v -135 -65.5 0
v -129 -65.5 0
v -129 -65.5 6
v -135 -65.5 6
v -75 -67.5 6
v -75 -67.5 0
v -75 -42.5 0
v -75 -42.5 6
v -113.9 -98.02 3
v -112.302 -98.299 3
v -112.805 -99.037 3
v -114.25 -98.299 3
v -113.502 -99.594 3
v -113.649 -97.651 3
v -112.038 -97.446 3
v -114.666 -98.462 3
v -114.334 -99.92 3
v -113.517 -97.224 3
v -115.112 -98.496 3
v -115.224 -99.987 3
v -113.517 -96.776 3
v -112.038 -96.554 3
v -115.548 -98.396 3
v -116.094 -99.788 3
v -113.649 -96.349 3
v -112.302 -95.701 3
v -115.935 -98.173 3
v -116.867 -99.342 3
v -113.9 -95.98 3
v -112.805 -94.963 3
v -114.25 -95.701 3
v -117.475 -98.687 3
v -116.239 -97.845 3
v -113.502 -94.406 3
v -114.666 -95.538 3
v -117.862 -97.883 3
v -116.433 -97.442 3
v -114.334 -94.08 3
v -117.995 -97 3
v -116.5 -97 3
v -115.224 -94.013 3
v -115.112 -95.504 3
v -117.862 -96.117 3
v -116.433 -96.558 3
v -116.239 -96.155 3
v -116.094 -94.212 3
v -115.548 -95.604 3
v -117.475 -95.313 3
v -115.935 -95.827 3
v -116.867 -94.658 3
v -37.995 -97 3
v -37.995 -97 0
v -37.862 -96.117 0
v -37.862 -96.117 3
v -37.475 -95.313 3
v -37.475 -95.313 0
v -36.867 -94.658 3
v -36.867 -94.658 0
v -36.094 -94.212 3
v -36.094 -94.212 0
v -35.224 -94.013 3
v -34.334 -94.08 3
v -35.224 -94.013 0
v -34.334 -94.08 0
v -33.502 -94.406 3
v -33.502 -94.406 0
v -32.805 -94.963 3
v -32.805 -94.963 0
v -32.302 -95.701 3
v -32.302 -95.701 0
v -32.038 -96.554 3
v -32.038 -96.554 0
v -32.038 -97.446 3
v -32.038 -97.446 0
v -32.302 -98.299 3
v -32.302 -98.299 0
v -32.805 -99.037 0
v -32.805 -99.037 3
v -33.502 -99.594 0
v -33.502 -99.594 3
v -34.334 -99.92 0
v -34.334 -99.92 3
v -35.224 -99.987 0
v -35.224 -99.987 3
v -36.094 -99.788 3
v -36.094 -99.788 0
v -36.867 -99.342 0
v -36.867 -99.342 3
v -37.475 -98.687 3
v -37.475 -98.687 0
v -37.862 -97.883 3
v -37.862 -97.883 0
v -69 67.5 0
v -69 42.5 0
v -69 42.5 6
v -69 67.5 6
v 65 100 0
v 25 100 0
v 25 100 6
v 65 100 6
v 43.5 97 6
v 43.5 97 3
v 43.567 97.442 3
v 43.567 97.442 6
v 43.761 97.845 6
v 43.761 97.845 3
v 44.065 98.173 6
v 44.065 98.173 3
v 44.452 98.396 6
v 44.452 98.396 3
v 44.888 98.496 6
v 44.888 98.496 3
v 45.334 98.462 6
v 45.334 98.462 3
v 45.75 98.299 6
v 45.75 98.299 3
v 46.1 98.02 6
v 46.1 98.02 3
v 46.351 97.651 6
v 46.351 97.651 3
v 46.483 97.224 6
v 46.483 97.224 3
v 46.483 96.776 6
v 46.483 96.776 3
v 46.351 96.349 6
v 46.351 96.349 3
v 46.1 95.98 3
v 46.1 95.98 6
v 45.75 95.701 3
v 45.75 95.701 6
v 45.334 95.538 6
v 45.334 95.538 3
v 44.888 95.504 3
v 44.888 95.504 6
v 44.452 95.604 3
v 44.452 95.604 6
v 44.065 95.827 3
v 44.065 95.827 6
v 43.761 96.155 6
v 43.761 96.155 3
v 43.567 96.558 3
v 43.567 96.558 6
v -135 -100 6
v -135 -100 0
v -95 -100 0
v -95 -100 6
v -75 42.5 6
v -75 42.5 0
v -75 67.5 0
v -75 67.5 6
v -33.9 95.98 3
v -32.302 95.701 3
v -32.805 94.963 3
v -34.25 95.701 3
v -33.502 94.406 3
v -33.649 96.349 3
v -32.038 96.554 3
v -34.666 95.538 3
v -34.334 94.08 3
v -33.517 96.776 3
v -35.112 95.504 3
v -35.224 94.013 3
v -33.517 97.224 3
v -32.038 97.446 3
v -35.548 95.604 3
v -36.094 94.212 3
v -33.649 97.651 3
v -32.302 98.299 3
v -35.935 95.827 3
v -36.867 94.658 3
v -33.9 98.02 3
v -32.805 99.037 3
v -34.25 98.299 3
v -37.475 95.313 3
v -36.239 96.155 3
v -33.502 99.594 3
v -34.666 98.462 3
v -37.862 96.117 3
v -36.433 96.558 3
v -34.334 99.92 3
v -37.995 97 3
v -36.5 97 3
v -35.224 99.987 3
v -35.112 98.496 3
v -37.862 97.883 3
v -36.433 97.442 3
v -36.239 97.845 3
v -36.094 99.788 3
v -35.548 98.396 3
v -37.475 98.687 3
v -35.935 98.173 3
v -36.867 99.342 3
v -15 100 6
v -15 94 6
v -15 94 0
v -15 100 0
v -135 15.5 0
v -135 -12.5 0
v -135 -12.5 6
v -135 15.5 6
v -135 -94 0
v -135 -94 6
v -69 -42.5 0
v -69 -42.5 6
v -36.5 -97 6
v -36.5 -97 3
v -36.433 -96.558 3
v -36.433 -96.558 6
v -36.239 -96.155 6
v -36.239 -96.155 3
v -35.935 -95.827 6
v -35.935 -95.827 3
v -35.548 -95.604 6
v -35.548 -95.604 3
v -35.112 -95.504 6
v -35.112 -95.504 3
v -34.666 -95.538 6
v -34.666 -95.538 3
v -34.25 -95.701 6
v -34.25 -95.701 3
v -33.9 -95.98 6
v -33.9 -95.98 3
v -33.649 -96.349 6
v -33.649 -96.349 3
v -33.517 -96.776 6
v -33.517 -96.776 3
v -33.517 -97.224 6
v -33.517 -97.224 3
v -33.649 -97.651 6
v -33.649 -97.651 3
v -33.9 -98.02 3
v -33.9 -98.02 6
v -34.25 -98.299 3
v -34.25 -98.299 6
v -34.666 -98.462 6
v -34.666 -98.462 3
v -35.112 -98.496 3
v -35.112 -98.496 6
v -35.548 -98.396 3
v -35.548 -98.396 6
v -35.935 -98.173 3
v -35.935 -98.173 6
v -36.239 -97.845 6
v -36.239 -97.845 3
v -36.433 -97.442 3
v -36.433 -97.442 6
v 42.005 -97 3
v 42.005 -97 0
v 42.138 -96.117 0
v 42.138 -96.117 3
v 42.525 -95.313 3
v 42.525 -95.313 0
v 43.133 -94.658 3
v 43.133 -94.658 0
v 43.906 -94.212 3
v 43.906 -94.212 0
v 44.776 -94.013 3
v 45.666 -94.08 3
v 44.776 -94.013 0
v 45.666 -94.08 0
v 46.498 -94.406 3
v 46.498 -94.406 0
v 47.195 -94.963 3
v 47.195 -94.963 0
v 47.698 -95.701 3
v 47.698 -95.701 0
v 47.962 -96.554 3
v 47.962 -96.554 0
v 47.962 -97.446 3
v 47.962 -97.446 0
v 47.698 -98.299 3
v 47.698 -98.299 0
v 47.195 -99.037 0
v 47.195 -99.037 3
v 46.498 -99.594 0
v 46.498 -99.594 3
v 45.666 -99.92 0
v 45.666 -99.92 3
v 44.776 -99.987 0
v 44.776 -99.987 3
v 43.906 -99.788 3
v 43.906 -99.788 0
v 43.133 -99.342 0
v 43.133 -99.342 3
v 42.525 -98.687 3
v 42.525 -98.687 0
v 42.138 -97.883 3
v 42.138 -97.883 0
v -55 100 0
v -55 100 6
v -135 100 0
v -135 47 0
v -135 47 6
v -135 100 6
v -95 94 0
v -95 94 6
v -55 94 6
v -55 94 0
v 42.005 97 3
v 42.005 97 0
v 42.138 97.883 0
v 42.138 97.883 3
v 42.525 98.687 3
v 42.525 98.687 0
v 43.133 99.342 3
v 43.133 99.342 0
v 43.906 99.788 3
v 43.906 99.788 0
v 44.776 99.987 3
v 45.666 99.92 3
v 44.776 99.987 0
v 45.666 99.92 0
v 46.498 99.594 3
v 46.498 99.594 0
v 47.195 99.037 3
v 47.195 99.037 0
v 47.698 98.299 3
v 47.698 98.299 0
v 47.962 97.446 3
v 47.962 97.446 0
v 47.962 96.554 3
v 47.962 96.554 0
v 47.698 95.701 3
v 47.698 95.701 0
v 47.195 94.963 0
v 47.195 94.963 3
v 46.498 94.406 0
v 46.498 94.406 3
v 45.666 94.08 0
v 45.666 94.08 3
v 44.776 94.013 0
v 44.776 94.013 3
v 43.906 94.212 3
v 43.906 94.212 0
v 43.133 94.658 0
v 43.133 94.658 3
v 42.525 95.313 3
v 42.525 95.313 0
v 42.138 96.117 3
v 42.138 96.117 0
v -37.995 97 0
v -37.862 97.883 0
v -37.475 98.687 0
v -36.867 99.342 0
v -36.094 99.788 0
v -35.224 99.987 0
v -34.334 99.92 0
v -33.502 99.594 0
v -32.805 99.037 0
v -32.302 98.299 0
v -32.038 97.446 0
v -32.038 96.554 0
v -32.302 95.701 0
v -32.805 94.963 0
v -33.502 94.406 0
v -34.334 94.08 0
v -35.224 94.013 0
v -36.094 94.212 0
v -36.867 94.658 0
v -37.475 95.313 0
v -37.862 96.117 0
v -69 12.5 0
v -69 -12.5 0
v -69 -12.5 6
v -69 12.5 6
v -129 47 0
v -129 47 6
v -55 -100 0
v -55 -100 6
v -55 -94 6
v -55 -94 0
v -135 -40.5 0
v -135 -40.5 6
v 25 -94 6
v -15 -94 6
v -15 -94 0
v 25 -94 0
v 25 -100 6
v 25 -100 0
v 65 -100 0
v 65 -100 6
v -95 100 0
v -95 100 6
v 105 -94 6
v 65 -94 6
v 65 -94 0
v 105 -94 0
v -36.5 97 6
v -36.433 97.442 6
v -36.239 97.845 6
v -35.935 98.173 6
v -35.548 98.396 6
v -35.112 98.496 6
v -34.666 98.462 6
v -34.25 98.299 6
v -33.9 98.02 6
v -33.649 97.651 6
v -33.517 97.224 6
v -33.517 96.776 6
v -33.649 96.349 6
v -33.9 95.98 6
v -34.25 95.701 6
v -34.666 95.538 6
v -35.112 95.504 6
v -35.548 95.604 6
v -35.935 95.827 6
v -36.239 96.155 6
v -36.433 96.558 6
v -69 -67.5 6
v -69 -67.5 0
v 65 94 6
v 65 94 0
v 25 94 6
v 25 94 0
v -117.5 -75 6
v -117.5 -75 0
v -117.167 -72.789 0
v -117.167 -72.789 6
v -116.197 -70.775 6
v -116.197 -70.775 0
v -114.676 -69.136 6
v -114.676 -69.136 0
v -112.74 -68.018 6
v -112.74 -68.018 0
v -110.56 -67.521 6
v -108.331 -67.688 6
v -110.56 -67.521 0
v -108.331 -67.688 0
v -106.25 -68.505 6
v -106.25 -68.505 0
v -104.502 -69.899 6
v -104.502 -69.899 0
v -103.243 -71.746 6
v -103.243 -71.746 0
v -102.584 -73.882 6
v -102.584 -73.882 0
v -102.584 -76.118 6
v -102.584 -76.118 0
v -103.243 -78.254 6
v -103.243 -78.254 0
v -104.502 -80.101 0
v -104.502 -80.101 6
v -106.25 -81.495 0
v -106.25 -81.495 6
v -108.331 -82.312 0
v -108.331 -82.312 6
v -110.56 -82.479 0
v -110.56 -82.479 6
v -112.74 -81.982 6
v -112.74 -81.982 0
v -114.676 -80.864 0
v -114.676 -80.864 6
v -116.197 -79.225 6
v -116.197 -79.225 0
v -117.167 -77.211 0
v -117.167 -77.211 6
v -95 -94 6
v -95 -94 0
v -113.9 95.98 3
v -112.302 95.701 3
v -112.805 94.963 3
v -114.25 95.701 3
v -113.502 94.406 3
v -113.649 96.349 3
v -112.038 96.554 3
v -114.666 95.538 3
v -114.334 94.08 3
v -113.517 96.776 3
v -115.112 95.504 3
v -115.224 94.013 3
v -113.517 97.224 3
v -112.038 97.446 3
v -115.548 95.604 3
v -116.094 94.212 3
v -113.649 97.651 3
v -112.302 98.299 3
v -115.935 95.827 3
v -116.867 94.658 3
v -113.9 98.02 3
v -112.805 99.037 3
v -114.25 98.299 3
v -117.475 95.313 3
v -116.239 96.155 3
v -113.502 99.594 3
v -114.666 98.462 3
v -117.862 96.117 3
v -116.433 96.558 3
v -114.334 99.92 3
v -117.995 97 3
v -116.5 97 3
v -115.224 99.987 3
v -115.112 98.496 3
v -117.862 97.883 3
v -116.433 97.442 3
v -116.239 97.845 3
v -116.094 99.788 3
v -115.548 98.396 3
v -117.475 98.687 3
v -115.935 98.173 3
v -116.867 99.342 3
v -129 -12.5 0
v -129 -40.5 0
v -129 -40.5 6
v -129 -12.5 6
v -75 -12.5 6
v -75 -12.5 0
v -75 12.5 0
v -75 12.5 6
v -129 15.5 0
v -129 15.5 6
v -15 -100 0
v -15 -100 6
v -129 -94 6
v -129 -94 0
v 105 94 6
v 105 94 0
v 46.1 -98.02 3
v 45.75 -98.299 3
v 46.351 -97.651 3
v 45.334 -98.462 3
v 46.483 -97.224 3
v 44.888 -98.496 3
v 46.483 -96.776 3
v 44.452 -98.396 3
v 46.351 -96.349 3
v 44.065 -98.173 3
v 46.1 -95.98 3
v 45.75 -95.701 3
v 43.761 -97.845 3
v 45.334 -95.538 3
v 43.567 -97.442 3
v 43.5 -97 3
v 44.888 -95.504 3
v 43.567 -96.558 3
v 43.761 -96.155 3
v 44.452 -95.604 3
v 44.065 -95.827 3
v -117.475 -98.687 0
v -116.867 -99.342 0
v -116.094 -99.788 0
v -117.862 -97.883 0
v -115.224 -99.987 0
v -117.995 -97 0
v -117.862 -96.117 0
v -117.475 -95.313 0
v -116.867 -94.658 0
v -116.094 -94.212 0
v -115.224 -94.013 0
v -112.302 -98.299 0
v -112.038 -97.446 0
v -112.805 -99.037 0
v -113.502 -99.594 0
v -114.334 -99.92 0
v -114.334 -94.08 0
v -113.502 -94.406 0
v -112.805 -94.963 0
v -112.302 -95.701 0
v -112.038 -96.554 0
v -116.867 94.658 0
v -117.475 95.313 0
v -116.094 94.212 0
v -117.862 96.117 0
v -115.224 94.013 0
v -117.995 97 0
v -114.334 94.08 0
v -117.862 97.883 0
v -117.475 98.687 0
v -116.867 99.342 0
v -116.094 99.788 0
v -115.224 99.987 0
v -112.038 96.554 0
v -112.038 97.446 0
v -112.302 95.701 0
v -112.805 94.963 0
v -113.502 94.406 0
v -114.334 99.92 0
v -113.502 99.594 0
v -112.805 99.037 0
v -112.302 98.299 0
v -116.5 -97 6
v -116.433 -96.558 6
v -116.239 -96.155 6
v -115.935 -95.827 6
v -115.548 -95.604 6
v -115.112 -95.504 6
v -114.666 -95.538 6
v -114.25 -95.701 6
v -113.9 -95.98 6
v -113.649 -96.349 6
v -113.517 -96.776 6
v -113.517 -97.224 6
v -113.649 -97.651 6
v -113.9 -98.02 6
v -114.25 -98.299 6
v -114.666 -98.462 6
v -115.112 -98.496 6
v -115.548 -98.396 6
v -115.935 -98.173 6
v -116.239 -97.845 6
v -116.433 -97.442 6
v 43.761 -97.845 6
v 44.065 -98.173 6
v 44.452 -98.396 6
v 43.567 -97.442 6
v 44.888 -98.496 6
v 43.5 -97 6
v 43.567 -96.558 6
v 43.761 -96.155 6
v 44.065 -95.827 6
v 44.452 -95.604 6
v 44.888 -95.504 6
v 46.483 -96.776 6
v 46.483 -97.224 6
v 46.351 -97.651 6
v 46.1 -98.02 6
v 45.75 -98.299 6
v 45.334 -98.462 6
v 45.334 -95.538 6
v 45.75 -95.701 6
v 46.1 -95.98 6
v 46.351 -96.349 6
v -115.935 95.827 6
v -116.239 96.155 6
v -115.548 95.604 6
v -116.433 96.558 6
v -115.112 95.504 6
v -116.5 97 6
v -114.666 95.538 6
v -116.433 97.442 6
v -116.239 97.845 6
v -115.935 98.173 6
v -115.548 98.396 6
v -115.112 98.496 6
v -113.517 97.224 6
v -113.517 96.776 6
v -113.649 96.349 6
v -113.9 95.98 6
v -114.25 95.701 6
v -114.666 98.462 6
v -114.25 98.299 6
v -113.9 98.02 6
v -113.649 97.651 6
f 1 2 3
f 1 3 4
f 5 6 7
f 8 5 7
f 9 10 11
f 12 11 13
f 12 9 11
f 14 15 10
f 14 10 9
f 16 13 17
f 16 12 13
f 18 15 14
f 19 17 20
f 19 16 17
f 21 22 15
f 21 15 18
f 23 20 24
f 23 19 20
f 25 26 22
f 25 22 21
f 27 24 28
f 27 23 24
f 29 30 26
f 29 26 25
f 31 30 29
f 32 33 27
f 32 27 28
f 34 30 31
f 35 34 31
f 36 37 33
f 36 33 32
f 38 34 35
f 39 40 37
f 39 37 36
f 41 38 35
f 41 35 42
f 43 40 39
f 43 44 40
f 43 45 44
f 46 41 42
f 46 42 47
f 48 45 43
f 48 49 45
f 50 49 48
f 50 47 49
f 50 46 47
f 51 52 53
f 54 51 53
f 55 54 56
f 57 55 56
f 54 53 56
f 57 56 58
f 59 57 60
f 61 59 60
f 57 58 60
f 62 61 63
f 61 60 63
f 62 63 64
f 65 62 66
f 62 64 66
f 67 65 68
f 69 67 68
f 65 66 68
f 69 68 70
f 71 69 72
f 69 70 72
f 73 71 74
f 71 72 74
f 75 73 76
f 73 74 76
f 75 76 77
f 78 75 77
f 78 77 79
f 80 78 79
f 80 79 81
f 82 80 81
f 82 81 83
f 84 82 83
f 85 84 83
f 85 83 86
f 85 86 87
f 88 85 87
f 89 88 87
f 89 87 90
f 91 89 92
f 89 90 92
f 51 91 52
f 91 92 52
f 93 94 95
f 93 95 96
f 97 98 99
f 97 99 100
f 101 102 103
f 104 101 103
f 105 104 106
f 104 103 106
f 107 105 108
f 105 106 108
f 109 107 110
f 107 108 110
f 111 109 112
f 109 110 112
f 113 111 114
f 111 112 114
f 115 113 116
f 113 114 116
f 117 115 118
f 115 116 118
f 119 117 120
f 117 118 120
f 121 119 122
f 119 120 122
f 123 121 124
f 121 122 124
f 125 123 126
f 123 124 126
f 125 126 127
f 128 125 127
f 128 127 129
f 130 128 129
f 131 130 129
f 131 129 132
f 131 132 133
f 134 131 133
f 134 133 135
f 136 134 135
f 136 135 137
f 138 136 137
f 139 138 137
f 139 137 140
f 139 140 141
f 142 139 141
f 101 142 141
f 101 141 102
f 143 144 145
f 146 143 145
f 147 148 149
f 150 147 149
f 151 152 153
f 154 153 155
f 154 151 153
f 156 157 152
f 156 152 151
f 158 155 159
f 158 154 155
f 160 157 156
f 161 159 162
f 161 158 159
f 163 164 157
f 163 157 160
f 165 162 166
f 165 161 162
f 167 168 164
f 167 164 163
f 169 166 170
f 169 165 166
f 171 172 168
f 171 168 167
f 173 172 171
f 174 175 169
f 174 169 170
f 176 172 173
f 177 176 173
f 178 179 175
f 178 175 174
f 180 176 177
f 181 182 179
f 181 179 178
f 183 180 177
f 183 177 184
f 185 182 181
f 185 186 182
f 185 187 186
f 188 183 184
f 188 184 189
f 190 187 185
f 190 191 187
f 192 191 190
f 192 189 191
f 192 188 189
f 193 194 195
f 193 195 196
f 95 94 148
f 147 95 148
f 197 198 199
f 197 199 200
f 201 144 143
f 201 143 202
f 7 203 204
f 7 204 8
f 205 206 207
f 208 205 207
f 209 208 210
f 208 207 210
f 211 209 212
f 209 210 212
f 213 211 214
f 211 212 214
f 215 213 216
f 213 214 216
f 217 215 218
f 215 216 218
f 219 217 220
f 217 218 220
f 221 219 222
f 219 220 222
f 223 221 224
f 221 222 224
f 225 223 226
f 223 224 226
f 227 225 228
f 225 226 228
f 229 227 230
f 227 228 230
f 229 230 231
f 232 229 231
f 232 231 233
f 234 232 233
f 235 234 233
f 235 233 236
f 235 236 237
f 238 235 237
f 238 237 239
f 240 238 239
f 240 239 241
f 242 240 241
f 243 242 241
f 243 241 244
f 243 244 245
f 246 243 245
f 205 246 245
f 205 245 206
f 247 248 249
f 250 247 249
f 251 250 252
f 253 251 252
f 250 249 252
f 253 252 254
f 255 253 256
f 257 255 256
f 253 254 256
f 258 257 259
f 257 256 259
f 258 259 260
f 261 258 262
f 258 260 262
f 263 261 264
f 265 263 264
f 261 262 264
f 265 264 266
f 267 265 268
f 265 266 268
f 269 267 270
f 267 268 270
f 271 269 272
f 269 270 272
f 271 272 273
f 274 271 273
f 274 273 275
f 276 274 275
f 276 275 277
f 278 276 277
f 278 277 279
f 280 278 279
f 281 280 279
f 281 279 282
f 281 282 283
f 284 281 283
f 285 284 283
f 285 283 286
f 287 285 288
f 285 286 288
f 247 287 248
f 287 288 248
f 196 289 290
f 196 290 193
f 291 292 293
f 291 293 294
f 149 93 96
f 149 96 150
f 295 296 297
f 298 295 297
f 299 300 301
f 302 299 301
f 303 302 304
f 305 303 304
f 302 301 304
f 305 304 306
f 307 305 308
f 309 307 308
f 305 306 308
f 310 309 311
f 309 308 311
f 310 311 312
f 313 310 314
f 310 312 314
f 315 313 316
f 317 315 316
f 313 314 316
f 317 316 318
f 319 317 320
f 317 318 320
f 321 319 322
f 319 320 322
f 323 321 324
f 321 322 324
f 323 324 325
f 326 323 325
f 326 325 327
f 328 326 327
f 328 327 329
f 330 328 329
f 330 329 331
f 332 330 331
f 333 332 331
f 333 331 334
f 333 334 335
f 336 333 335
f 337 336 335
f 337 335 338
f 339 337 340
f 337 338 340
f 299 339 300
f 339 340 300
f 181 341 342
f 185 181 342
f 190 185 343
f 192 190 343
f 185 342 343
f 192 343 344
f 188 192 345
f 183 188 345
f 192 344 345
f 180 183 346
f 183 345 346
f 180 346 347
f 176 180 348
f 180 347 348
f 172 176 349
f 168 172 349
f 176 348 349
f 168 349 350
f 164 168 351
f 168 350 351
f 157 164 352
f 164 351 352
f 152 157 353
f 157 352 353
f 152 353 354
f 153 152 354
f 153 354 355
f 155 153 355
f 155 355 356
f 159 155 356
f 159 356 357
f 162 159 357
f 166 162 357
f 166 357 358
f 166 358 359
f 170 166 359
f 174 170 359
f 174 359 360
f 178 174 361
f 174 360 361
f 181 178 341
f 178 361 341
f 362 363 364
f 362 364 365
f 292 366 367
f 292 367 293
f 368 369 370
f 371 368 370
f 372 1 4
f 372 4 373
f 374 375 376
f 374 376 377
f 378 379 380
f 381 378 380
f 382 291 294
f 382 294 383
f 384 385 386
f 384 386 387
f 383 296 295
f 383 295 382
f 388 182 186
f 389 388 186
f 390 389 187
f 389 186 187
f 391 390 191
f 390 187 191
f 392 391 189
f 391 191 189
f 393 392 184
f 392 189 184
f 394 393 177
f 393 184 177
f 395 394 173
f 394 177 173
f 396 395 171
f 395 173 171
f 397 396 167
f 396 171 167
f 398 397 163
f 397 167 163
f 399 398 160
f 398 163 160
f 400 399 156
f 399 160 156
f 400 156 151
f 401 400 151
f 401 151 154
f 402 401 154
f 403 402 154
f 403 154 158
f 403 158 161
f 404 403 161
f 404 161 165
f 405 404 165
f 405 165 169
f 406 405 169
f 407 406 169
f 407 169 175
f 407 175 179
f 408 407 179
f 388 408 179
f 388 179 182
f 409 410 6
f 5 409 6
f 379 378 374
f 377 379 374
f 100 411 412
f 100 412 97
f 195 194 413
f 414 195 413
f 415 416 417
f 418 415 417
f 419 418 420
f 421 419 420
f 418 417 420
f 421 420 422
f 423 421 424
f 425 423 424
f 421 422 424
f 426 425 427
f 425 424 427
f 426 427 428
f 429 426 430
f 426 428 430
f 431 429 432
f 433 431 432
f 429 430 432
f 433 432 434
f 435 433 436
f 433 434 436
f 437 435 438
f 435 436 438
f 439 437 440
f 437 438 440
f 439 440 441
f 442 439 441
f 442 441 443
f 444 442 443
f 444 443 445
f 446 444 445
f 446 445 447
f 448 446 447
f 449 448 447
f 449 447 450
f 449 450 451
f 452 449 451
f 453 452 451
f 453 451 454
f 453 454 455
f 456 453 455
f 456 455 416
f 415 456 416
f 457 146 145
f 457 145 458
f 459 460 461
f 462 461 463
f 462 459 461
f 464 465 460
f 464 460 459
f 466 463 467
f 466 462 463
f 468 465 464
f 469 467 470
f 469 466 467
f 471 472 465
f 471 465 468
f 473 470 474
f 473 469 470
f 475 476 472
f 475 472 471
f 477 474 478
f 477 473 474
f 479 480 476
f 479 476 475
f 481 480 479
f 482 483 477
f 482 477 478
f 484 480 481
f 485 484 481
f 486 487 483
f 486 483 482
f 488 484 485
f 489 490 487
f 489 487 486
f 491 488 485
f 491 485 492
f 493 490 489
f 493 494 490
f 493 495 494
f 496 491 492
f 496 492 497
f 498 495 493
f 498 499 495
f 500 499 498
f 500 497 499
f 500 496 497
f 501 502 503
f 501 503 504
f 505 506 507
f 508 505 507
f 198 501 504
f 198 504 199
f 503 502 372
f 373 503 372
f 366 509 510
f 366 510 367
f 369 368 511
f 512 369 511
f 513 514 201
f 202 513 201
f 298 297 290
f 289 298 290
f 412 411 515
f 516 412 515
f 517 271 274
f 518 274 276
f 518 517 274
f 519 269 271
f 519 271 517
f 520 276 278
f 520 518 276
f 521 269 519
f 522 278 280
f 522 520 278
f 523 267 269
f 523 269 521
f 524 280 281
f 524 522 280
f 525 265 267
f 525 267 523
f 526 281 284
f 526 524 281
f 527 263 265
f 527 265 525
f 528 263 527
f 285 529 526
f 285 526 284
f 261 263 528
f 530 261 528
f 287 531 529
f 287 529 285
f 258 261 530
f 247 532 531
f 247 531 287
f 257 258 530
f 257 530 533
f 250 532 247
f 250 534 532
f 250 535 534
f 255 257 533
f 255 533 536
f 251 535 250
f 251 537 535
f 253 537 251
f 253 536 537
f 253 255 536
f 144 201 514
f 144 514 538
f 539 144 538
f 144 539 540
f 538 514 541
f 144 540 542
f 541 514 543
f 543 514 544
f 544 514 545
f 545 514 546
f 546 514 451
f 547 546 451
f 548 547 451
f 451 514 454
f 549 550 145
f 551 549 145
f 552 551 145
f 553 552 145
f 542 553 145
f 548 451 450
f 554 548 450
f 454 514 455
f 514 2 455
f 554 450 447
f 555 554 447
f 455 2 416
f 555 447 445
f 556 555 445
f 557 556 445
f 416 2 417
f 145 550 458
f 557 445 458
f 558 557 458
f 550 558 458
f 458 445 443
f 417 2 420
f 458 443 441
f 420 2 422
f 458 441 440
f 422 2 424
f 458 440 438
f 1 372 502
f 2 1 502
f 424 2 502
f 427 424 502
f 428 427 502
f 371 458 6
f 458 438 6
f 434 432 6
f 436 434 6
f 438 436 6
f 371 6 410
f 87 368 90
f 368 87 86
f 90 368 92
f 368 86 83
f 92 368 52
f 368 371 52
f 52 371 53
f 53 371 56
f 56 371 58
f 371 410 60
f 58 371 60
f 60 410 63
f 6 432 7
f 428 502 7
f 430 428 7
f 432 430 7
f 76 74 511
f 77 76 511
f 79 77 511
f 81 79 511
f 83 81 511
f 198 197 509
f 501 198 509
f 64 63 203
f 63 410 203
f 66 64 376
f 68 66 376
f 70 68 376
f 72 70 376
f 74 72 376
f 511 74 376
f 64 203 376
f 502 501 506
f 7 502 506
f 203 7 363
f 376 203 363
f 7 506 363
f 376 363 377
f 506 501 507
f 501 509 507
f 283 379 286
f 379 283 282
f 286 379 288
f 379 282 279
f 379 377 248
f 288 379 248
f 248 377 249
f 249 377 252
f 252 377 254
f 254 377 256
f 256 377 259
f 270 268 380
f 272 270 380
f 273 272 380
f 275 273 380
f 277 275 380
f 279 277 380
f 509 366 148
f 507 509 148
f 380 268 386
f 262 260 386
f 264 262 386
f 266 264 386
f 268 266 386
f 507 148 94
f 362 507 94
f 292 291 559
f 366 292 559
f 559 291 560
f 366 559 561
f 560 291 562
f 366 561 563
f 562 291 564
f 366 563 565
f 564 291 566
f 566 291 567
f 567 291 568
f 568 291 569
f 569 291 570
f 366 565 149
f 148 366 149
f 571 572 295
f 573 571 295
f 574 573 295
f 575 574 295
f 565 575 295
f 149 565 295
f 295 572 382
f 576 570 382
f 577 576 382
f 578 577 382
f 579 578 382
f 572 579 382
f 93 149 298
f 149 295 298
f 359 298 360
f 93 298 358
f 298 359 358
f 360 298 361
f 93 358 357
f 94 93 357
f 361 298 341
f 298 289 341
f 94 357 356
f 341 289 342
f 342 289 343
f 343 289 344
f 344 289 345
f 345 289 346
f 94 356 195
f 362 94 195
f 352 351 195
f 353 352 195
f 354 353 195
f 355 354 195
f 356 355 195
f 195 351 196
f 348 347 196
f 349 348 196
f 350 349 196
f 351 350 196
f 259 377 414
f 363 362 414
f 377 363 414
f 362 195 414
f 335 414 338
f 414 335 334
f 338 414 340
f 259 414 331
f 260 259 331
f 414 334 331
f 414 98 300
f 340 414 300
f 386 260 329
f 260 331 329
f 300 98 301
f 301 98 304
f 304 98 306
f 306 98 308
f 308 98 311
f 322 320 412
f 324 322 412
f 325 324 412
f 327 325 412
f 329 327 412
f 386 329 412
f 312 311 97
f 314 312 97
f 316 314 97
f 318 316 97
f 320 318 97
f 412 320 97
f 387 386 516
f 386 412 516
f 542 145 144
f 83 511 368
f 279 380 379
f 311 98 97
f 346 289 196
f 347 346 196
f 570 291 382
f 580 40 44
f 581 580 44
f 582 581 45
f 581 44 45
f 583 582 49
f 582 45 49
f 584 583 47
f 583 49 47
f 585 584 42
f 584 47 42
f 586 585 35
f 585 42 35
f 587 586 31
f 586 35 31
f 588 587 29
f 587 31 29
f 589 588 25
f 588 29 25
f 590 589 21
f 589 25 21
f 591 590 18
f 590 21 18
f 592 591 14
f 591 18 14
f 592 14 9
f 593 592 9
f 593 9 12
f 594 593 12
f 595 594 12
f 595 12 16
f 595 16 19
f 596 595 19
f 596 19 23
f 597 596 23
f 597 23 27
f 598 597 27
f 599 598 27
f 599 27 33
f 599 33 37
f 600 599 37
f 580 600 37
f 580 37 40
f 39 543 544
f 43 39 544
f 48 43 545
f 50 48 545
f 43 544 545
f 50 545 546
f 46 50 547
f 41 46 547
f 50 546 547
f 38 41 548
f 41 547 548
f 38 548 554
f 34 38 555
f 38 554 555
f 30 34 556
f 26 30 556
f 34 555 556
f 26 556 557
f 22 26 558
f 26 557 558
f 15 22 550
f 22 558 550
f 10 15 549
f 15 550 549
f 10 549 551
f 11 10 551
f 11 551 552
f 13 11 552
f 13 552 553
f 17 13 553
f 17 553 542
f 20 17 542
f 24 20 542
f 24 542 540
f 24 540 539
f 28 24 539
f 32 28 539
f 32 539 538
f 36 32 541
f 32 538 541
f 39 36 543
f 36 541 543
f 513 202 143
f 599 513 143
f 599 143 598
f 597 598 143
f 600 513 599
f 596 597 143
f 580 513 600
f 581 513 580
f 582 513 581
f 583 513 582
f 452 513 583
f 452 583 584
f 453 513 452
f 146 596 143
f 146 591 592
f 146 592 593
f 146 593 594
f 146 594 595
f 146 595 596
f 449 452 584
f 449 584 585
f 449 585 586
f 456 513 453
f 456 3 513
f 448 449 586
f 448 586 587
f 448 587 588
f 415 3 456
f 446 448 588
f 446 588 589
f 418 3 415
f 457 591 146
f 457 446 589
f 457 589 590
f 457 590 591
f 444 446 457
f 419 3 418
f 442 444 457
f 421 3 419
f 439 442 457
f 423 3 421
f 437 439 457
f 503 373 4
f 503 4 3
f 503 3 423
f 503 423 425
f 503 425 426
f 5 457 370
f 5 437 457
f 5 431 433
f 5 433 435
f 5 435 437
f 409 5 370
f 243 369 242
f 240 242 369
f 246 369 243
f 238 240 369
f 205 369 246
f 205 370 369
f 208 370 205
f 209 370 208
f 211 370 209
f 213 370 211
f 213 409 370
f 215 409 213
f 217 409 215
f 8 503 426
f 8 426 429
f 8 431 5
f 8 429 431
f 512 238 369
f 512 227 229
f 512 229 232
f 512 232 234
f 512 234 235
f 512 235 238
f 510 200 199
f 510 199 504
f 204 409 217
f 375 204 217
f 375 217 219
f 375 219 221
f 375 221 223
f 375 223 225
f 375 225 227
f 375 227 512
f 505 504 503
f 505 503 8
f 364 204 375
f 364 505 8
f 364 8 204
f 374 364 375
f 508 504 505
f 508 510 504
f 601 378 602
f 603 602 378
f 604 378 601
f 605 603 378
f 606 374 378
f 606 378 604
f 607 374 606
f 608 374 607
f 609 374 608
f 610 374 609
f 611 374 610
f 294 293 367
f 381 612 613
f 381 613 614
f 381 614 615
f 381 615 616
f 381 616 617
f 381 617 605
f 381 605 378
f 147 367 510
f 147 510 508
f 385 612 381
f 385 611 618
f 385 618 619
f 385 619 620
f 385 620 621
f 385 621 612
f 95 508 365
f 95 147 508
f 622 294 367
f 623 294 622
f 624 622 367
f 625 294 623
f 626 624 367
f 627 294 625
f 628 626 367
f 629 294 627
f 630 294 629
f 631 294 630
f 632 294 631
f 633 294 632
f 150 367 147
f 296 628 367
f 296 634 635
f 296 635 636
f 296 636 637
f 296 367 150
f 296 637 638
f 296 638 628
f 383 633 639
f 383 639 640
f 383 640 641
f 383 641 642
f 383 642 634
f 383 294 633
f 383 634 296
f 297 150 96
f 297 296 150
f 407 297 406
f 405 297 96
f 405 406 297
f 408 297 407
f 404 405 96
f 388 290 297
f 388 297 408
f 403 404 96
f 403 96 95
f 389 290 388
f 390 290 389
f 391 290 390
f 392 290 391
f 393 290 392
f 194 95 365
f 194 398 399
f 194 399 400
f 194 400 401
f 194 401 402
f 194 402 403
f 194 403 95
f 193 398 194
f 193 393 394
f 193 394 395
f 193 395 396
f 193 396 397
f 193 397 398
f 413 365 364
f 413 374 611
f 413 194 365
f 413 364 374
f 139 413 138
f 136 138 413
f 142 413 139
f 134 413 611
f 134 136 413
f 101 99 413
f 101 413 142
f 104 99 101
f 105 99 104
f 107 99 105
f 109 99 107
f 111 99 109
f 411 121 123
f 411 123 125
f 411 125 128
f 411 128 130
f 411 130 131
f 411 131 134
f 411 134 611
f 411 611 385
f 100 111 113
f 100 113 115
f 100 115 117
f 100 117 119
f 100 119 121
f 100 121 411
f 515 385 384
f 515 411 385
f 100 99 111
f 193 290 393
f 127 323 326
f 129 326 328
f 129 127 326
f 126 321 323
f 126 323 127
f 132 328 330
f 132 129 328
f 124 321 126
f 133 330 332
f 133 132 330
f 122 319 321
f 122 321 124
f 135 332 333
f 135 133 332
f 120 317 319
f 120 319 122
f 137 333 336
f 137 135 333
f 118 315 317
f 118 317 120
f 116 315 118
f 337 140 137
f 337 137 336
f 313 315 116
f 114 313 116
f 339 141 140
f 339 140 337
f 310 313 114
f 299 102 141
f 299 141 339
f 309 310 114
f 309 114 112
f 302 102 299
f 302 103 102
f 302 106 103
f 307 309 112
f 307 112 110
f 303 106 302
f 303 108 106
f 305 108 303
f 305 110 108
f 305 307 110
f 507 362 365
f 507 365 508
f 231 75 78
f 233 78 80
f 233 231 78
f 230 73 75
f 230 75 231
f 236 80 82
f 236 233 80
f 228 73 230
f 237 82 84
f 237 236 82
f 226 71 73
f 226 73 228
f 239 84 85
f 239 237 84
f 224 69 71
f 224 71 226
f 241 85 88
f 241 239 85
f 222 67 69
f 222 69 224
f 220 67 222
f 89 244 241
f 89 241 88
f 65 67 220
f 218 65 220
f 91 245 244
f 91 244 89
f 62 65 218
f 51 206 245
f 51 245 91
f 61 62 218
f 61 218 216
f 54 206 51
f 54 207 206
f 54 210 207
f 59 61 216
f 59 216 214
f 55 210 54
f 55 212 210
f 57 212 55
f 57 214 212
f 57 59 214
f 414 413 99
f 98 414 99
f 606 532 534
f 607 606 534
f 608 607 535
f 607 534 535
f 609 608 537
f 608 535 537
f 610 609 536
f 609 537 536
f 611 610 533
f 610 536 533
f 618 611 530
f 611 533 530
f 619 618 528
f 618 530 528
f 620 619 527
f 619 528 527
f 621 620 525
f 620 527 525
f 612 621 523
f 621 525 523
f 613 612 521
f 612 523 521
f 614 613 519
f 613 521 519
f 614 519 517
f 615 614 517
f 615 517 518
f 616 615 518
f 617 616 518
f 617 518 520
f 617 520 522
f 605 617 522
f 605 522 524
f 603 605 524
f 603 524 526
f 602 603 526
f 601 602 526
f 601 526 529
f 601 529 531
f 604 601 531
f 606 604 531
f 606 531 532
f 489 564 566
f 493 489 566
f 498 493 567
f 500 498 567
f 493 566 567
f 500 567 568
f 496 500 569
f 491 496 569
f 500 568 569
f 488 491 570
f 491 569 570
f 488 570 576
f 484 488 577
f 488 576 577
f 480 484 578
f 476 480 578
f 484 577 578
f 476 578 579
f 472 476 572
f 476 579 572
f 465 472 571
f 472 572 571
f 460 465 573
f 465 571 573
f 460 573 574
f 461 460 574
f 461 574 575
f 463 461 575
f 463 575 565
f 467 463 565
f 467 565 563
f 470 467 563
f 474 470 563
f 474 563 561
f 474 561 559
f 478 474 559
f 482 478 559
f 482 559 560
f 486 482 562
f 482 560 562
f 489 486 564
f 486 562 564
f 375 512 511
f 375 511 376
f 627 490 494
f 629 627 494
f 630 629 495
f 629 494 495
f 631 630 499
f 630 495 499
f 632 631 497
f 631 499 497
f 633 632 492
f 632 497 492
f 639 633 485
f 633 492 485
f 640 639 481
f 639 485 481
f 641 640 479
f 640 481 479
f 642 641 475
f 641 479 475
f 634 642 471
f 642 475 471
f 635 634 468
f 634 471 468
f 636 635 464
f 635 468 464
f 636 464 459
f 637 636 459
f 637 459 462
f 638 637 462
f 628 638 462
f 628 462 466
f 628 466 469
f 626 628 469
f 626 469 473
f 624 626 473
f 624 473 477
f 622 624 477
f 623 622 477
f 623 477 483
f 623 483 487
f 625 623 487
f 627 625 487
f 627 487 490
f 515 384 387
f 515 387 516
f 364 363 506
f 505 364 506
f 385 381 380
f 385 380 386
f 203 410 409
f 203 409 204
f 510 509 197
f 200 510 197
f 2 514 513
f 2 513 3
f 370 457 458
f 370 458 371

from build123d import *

# Parameters (mm, degrees)
ESQUISSE1_W             = 270
ESQUISSE1_H             = 200
BOSS_EXTRU_1_DEPTH      = 6
ESQUISSE2_R             = 7.5
ENL_V_MAT_EXTRU_1_DEPTH = 10
ESQUISSE4_W             = 40
ESQUISSE4_H             = 6
ESQUISSE4_W_2           = 6
ESQUISSE4_H_2           = 50
ESQUISSE4_H_3           = 40
ENL_V_MAT_EXTRU_2_DEPTH = 6
ESQUISSE5_W             = 6
ESQUISSE5_H             = 25
ENL_V_MAT_EXTRU_3_DEPTH = 10
ESQUISSE6_W             = 30.179320299
ESQUISSE6_H             = 200.522044325
ENL_V_MAT_EXTRU_4_DEPTH = 169.110082981
ESQUISSE7_R             = 2.995
ENL_V_MAT_EXTRU_5_DEPTH = 3
ESQUISSE8_R             = 1.5
ENL_V_MAT_EXTRU_6_DEPTH = 13
ESQUISSE9_W             = 6
ESQUISSE9_H             = 28.5
ESQUISSE9_H_2           = 28
ESQUISSE9_H_3           = 31.5
ENL_V_MAT_EXTRU_7_DEPTH = 10


with BuildPart() as part:
    # Esquisse1 → Boss.-Extru.1 (new body)
    with BuildSketch(Plane.XY):
        Rectangle(ESQUISSE1_W, ESQUISSE1_H)
    extrude(amount=BOSS_EXTRU_1_DEPTH)

    # Esquisse2 → Enlèv. mat.-Extru.1 (cut)
    with BuildSketch(Plane(origin=(0, 0, 0), x_dir=(-1, 0, 0), z_dir=(0, 0, -1))):
        with Locations((110, -75)):
            Circle(ESQUISSE2_R)
    extrude(amount=-ENL_V_MAT_EXTRU_1_DEPTH, mode=Mode.SUBTRACT)

    # Esquisse4 → Enlèv. mat.-Extru.2 (cut)
    with BuildSketch(Plane.XY.offset(6)):
        with Locations((-75, -97)):
            Rectangle(ESQUISSE4_W, ESQUISSE4_H)
        with Locations((5, -97)):
            Rectangle(ESQUISSE4_W, ESQUISSE4_H)
        with Locations((85, -97)):
            Rectangle(ESQUISSE4_W, ESQUISSE4_H)
        with Locations((-75, 97)):
            Rectangle(ESQUISSE4_W, ESQUISSE4_H)
        with Locations((5, 97)):
            Rectangle(ESQUISSE4_W, ESQUISSE4_H)
        with Locations((85, 97)):
            Rectangle(ESQUISSE4_W, ESQUISSE4_H)
        with Locations((132, -75)):
            Rectangle(ESQUISSE4_W_2, ESQUISSE4_H_2)
        with Locations((132, 75)):
            Rectangle(ESQUISSE4_W_2, ESQUISSE4_H_2)
        with Locations((132, 0)):
            Rectangle(ESQUISSE4_W_2, ESQUISSE4_H_3)
    extrude(amount=-ENL_V_MAT_EXTRU_2_DEPTH, mode=Mode.SUBTRACT)

    # Esquisse5 → Enlèv. mat.-Extru.3 (cut)
    with BuildSketch(Plane(origin=(0, 0, 0), x_dir=(-1, 0, 0), z_dir=(0, 0, -1))):
        with Locations((72, -55)):
            Rectangle(ESQUISSE5_W, ESQUISSE5_H)
        with Locations((72, 0)):
            Rectangle(ESQUISSE5_W, ESQUISSE5_H)
        with Locations((72, 55)):
            Rectangle(ESQUISSE5_W, ESQUISSE5_H)
    extrude(amount=-ENL_V_MAT_EXTRU_3_DEPTH, mode=Mode.SUBTRACT)

    # Esquisse6 → Enlèv. mat.-Extru.4 (cut, through all)
    with BuildSketch(Plane.XY.offset(6)):
        with Locations((120.08966015, -0.261022163)):
            Rectangle(ESQUISSE6_W, ESQUISSE6_H)
    extrude(amount=-ENL_V_MAT_EXTRU_4_DEPTH, mode=Mode.SUBTRACT)

    # Esquisse7 → Enlèv. mat.-Extru.5 (cut)
    with BuildSketch(Plane(origin=(0, 0, 0), x_dir=(-1, 0, 0), z_dir=(0, 0, -1))):
        with Locations((-45, 97)):
            Circle(ESQUISSE7_R)
        with Locations((35, 97)):
            Circle(ESQUISSE7_R)
        with Locations((115, 97)):
            Circle(ESQUISSE7_R)
        with Locations((-45, -97)):
            Circle(ESQUISSE7_R)
        with Locations((35, -97)):
            Circle(ESQUISSE7_R)
        with Locations((115, -97)):
            Circle(ESQUISSE7_R)
    extrude(amount=-ENL_V_MAT_EXTRU_5_DEPTH, mode=Mode.SUBTRACT)

    # Esquisse8 → Enlèv. mat.-Extru.6 (cut)
    with BuildSketch(Plane(origin=(0, 0, 0), x_dir=(-1, 0, 0), z_dir=(0, 0, -1))):
        with Locations((-45, 97)):
            Circle(ESQUISSE8_R)
        with Locations((35, 97)):
            Circle(ESQUISSE8_R)
        with Locations((115, 97)):
            Circle(ESQUISSE8_R)
        with Locations((-45, -97)):
            Circle(ESQUISSE8_R)
        with Locations((35, -97)):
            Circle(ESQUISSE8_R)
        with Locations((115, -97)):
            Circle(ESQUISSE8_R)
    extrude(amount=-ENL_V_MAT_EXTRU_6_DEPTH, mode=Mode.SUBTRACT)

    # Esquisse9 → Enlèv. mat.-Extru.7 (cut)
    with BuildSketch(Plane(origin=(0, 0, 0), x_dir=(-1, 0, 0), z_dir=(0, 0, -1))):
        with Locations((132, -79.75)):
            Rectangle(ESQUISSE9_W, ESQUISSE9_H)
        with Locations((132, -26.5)):
            Rectangle(ESQUISSE9_W, ESQUISSE9_H_2)
        with Locations((132, 31.25)):
            Rectangle(ESQUISSE9_W, ESQUISSE9_H_3)
    extrude(amount=-ENL_V_MAT_EXTRU_7_DEPTH, mode=Mode.SUBTRACT)


solid = part.part
